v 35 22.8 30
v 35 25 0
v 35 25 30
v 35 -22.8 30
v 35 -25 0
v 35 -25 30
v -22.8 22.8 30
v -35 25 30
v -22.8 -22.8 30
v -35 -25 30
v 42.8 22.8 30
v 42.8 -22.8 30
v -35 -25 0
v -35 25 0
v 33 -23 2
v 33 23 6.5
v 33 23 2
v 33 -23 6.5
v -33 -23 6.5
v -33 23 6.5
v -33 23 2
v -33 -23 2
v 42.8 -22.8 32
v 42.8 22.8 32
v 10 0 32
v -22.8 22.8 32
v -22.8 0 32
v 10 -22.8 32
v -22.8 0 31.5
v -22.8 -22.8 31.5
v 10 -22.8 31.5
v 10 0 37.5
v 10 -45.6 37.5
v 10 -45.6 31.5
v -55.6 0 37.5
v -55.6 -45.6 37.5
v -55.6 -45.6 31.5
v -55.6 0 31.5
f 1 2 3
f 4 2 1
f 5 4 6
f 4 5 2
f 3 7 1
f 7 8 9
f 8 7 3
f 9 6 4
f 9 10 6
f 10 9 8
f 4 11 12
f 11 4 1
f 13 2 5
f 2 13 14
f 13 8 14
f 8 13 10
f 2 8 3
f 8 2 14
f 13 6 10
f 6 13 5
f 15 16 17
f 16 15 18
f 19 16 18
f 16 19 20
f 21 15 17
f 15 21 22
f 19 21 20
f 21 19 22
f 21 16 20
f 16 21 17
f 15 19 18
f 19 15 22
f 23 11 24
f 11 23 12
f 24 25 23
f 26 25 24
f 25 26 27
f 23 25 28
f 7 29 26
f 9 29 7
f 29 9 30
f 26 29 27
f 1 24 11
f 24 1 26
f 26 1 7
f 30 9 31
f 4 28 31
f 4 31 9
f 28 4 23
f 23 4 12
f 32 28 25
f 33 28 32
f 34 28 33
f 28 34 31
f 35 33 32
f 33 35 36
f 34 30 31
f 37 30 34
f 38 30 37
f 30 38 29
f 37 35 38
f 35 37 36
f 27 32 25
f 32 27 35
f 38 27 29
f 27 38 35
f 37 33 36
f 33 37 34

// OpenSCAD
// Two-part enclosure for small electronics board
// Print orientation: box standing on bed, lid upside down (plate on bed)

$fn = 64;

// ---- Box ----
box_x = 70;      // outer length (X)
box_y = 50;      // outer width (Y)
box_z = 30;      // outer height (Z)
wall = 2;        // side wall thickness
floor = 2;       // floor thickness

// ---- Lid ----
lip_w = 65.6;    // lip outer length (X)
lip_d = 45.6;    // lip outer width (Y)
lip_h = 4;       // lip height (wall thickness)
lip_t = 1.5;     // lip top thickness

// ---- Misc ----
eps = 0.5;       // cutter overshoot
gap = 10;        // gap between parts on bed

// Derived
inner_x = box_x - 2*wall;
inner_y = box_y - 2*wall;
lip_total_h = lip_h + lip_t;   // from plate top to lip top

module box() {
    difference() {
        translate([-box_x/2, -box_y/2, 0])
            cube([box_x, box_y, box_z]);
        // open top: cut down to inside of side walls
        translate([-inner_x/2, -inner_y/2, floor])
            cube([inner_x, inner_y, floor + wall + eps]);
    }
}

module lid() {
    translate([gap - lip_w/2, -lip_d/2, 0]) {
        // plate
        cube([lip_w, lip_d, 2]);
        // lip (overlaps plate slightly -> one solid)
        translate([-lip_w/2, -lip_d/2, 2 - eps])
            cube([lip_w, lip_d, lip_total_h + eps]);
    }
}

union() {
    box();
    translate([0, 0, box_z])
        lid();
}
